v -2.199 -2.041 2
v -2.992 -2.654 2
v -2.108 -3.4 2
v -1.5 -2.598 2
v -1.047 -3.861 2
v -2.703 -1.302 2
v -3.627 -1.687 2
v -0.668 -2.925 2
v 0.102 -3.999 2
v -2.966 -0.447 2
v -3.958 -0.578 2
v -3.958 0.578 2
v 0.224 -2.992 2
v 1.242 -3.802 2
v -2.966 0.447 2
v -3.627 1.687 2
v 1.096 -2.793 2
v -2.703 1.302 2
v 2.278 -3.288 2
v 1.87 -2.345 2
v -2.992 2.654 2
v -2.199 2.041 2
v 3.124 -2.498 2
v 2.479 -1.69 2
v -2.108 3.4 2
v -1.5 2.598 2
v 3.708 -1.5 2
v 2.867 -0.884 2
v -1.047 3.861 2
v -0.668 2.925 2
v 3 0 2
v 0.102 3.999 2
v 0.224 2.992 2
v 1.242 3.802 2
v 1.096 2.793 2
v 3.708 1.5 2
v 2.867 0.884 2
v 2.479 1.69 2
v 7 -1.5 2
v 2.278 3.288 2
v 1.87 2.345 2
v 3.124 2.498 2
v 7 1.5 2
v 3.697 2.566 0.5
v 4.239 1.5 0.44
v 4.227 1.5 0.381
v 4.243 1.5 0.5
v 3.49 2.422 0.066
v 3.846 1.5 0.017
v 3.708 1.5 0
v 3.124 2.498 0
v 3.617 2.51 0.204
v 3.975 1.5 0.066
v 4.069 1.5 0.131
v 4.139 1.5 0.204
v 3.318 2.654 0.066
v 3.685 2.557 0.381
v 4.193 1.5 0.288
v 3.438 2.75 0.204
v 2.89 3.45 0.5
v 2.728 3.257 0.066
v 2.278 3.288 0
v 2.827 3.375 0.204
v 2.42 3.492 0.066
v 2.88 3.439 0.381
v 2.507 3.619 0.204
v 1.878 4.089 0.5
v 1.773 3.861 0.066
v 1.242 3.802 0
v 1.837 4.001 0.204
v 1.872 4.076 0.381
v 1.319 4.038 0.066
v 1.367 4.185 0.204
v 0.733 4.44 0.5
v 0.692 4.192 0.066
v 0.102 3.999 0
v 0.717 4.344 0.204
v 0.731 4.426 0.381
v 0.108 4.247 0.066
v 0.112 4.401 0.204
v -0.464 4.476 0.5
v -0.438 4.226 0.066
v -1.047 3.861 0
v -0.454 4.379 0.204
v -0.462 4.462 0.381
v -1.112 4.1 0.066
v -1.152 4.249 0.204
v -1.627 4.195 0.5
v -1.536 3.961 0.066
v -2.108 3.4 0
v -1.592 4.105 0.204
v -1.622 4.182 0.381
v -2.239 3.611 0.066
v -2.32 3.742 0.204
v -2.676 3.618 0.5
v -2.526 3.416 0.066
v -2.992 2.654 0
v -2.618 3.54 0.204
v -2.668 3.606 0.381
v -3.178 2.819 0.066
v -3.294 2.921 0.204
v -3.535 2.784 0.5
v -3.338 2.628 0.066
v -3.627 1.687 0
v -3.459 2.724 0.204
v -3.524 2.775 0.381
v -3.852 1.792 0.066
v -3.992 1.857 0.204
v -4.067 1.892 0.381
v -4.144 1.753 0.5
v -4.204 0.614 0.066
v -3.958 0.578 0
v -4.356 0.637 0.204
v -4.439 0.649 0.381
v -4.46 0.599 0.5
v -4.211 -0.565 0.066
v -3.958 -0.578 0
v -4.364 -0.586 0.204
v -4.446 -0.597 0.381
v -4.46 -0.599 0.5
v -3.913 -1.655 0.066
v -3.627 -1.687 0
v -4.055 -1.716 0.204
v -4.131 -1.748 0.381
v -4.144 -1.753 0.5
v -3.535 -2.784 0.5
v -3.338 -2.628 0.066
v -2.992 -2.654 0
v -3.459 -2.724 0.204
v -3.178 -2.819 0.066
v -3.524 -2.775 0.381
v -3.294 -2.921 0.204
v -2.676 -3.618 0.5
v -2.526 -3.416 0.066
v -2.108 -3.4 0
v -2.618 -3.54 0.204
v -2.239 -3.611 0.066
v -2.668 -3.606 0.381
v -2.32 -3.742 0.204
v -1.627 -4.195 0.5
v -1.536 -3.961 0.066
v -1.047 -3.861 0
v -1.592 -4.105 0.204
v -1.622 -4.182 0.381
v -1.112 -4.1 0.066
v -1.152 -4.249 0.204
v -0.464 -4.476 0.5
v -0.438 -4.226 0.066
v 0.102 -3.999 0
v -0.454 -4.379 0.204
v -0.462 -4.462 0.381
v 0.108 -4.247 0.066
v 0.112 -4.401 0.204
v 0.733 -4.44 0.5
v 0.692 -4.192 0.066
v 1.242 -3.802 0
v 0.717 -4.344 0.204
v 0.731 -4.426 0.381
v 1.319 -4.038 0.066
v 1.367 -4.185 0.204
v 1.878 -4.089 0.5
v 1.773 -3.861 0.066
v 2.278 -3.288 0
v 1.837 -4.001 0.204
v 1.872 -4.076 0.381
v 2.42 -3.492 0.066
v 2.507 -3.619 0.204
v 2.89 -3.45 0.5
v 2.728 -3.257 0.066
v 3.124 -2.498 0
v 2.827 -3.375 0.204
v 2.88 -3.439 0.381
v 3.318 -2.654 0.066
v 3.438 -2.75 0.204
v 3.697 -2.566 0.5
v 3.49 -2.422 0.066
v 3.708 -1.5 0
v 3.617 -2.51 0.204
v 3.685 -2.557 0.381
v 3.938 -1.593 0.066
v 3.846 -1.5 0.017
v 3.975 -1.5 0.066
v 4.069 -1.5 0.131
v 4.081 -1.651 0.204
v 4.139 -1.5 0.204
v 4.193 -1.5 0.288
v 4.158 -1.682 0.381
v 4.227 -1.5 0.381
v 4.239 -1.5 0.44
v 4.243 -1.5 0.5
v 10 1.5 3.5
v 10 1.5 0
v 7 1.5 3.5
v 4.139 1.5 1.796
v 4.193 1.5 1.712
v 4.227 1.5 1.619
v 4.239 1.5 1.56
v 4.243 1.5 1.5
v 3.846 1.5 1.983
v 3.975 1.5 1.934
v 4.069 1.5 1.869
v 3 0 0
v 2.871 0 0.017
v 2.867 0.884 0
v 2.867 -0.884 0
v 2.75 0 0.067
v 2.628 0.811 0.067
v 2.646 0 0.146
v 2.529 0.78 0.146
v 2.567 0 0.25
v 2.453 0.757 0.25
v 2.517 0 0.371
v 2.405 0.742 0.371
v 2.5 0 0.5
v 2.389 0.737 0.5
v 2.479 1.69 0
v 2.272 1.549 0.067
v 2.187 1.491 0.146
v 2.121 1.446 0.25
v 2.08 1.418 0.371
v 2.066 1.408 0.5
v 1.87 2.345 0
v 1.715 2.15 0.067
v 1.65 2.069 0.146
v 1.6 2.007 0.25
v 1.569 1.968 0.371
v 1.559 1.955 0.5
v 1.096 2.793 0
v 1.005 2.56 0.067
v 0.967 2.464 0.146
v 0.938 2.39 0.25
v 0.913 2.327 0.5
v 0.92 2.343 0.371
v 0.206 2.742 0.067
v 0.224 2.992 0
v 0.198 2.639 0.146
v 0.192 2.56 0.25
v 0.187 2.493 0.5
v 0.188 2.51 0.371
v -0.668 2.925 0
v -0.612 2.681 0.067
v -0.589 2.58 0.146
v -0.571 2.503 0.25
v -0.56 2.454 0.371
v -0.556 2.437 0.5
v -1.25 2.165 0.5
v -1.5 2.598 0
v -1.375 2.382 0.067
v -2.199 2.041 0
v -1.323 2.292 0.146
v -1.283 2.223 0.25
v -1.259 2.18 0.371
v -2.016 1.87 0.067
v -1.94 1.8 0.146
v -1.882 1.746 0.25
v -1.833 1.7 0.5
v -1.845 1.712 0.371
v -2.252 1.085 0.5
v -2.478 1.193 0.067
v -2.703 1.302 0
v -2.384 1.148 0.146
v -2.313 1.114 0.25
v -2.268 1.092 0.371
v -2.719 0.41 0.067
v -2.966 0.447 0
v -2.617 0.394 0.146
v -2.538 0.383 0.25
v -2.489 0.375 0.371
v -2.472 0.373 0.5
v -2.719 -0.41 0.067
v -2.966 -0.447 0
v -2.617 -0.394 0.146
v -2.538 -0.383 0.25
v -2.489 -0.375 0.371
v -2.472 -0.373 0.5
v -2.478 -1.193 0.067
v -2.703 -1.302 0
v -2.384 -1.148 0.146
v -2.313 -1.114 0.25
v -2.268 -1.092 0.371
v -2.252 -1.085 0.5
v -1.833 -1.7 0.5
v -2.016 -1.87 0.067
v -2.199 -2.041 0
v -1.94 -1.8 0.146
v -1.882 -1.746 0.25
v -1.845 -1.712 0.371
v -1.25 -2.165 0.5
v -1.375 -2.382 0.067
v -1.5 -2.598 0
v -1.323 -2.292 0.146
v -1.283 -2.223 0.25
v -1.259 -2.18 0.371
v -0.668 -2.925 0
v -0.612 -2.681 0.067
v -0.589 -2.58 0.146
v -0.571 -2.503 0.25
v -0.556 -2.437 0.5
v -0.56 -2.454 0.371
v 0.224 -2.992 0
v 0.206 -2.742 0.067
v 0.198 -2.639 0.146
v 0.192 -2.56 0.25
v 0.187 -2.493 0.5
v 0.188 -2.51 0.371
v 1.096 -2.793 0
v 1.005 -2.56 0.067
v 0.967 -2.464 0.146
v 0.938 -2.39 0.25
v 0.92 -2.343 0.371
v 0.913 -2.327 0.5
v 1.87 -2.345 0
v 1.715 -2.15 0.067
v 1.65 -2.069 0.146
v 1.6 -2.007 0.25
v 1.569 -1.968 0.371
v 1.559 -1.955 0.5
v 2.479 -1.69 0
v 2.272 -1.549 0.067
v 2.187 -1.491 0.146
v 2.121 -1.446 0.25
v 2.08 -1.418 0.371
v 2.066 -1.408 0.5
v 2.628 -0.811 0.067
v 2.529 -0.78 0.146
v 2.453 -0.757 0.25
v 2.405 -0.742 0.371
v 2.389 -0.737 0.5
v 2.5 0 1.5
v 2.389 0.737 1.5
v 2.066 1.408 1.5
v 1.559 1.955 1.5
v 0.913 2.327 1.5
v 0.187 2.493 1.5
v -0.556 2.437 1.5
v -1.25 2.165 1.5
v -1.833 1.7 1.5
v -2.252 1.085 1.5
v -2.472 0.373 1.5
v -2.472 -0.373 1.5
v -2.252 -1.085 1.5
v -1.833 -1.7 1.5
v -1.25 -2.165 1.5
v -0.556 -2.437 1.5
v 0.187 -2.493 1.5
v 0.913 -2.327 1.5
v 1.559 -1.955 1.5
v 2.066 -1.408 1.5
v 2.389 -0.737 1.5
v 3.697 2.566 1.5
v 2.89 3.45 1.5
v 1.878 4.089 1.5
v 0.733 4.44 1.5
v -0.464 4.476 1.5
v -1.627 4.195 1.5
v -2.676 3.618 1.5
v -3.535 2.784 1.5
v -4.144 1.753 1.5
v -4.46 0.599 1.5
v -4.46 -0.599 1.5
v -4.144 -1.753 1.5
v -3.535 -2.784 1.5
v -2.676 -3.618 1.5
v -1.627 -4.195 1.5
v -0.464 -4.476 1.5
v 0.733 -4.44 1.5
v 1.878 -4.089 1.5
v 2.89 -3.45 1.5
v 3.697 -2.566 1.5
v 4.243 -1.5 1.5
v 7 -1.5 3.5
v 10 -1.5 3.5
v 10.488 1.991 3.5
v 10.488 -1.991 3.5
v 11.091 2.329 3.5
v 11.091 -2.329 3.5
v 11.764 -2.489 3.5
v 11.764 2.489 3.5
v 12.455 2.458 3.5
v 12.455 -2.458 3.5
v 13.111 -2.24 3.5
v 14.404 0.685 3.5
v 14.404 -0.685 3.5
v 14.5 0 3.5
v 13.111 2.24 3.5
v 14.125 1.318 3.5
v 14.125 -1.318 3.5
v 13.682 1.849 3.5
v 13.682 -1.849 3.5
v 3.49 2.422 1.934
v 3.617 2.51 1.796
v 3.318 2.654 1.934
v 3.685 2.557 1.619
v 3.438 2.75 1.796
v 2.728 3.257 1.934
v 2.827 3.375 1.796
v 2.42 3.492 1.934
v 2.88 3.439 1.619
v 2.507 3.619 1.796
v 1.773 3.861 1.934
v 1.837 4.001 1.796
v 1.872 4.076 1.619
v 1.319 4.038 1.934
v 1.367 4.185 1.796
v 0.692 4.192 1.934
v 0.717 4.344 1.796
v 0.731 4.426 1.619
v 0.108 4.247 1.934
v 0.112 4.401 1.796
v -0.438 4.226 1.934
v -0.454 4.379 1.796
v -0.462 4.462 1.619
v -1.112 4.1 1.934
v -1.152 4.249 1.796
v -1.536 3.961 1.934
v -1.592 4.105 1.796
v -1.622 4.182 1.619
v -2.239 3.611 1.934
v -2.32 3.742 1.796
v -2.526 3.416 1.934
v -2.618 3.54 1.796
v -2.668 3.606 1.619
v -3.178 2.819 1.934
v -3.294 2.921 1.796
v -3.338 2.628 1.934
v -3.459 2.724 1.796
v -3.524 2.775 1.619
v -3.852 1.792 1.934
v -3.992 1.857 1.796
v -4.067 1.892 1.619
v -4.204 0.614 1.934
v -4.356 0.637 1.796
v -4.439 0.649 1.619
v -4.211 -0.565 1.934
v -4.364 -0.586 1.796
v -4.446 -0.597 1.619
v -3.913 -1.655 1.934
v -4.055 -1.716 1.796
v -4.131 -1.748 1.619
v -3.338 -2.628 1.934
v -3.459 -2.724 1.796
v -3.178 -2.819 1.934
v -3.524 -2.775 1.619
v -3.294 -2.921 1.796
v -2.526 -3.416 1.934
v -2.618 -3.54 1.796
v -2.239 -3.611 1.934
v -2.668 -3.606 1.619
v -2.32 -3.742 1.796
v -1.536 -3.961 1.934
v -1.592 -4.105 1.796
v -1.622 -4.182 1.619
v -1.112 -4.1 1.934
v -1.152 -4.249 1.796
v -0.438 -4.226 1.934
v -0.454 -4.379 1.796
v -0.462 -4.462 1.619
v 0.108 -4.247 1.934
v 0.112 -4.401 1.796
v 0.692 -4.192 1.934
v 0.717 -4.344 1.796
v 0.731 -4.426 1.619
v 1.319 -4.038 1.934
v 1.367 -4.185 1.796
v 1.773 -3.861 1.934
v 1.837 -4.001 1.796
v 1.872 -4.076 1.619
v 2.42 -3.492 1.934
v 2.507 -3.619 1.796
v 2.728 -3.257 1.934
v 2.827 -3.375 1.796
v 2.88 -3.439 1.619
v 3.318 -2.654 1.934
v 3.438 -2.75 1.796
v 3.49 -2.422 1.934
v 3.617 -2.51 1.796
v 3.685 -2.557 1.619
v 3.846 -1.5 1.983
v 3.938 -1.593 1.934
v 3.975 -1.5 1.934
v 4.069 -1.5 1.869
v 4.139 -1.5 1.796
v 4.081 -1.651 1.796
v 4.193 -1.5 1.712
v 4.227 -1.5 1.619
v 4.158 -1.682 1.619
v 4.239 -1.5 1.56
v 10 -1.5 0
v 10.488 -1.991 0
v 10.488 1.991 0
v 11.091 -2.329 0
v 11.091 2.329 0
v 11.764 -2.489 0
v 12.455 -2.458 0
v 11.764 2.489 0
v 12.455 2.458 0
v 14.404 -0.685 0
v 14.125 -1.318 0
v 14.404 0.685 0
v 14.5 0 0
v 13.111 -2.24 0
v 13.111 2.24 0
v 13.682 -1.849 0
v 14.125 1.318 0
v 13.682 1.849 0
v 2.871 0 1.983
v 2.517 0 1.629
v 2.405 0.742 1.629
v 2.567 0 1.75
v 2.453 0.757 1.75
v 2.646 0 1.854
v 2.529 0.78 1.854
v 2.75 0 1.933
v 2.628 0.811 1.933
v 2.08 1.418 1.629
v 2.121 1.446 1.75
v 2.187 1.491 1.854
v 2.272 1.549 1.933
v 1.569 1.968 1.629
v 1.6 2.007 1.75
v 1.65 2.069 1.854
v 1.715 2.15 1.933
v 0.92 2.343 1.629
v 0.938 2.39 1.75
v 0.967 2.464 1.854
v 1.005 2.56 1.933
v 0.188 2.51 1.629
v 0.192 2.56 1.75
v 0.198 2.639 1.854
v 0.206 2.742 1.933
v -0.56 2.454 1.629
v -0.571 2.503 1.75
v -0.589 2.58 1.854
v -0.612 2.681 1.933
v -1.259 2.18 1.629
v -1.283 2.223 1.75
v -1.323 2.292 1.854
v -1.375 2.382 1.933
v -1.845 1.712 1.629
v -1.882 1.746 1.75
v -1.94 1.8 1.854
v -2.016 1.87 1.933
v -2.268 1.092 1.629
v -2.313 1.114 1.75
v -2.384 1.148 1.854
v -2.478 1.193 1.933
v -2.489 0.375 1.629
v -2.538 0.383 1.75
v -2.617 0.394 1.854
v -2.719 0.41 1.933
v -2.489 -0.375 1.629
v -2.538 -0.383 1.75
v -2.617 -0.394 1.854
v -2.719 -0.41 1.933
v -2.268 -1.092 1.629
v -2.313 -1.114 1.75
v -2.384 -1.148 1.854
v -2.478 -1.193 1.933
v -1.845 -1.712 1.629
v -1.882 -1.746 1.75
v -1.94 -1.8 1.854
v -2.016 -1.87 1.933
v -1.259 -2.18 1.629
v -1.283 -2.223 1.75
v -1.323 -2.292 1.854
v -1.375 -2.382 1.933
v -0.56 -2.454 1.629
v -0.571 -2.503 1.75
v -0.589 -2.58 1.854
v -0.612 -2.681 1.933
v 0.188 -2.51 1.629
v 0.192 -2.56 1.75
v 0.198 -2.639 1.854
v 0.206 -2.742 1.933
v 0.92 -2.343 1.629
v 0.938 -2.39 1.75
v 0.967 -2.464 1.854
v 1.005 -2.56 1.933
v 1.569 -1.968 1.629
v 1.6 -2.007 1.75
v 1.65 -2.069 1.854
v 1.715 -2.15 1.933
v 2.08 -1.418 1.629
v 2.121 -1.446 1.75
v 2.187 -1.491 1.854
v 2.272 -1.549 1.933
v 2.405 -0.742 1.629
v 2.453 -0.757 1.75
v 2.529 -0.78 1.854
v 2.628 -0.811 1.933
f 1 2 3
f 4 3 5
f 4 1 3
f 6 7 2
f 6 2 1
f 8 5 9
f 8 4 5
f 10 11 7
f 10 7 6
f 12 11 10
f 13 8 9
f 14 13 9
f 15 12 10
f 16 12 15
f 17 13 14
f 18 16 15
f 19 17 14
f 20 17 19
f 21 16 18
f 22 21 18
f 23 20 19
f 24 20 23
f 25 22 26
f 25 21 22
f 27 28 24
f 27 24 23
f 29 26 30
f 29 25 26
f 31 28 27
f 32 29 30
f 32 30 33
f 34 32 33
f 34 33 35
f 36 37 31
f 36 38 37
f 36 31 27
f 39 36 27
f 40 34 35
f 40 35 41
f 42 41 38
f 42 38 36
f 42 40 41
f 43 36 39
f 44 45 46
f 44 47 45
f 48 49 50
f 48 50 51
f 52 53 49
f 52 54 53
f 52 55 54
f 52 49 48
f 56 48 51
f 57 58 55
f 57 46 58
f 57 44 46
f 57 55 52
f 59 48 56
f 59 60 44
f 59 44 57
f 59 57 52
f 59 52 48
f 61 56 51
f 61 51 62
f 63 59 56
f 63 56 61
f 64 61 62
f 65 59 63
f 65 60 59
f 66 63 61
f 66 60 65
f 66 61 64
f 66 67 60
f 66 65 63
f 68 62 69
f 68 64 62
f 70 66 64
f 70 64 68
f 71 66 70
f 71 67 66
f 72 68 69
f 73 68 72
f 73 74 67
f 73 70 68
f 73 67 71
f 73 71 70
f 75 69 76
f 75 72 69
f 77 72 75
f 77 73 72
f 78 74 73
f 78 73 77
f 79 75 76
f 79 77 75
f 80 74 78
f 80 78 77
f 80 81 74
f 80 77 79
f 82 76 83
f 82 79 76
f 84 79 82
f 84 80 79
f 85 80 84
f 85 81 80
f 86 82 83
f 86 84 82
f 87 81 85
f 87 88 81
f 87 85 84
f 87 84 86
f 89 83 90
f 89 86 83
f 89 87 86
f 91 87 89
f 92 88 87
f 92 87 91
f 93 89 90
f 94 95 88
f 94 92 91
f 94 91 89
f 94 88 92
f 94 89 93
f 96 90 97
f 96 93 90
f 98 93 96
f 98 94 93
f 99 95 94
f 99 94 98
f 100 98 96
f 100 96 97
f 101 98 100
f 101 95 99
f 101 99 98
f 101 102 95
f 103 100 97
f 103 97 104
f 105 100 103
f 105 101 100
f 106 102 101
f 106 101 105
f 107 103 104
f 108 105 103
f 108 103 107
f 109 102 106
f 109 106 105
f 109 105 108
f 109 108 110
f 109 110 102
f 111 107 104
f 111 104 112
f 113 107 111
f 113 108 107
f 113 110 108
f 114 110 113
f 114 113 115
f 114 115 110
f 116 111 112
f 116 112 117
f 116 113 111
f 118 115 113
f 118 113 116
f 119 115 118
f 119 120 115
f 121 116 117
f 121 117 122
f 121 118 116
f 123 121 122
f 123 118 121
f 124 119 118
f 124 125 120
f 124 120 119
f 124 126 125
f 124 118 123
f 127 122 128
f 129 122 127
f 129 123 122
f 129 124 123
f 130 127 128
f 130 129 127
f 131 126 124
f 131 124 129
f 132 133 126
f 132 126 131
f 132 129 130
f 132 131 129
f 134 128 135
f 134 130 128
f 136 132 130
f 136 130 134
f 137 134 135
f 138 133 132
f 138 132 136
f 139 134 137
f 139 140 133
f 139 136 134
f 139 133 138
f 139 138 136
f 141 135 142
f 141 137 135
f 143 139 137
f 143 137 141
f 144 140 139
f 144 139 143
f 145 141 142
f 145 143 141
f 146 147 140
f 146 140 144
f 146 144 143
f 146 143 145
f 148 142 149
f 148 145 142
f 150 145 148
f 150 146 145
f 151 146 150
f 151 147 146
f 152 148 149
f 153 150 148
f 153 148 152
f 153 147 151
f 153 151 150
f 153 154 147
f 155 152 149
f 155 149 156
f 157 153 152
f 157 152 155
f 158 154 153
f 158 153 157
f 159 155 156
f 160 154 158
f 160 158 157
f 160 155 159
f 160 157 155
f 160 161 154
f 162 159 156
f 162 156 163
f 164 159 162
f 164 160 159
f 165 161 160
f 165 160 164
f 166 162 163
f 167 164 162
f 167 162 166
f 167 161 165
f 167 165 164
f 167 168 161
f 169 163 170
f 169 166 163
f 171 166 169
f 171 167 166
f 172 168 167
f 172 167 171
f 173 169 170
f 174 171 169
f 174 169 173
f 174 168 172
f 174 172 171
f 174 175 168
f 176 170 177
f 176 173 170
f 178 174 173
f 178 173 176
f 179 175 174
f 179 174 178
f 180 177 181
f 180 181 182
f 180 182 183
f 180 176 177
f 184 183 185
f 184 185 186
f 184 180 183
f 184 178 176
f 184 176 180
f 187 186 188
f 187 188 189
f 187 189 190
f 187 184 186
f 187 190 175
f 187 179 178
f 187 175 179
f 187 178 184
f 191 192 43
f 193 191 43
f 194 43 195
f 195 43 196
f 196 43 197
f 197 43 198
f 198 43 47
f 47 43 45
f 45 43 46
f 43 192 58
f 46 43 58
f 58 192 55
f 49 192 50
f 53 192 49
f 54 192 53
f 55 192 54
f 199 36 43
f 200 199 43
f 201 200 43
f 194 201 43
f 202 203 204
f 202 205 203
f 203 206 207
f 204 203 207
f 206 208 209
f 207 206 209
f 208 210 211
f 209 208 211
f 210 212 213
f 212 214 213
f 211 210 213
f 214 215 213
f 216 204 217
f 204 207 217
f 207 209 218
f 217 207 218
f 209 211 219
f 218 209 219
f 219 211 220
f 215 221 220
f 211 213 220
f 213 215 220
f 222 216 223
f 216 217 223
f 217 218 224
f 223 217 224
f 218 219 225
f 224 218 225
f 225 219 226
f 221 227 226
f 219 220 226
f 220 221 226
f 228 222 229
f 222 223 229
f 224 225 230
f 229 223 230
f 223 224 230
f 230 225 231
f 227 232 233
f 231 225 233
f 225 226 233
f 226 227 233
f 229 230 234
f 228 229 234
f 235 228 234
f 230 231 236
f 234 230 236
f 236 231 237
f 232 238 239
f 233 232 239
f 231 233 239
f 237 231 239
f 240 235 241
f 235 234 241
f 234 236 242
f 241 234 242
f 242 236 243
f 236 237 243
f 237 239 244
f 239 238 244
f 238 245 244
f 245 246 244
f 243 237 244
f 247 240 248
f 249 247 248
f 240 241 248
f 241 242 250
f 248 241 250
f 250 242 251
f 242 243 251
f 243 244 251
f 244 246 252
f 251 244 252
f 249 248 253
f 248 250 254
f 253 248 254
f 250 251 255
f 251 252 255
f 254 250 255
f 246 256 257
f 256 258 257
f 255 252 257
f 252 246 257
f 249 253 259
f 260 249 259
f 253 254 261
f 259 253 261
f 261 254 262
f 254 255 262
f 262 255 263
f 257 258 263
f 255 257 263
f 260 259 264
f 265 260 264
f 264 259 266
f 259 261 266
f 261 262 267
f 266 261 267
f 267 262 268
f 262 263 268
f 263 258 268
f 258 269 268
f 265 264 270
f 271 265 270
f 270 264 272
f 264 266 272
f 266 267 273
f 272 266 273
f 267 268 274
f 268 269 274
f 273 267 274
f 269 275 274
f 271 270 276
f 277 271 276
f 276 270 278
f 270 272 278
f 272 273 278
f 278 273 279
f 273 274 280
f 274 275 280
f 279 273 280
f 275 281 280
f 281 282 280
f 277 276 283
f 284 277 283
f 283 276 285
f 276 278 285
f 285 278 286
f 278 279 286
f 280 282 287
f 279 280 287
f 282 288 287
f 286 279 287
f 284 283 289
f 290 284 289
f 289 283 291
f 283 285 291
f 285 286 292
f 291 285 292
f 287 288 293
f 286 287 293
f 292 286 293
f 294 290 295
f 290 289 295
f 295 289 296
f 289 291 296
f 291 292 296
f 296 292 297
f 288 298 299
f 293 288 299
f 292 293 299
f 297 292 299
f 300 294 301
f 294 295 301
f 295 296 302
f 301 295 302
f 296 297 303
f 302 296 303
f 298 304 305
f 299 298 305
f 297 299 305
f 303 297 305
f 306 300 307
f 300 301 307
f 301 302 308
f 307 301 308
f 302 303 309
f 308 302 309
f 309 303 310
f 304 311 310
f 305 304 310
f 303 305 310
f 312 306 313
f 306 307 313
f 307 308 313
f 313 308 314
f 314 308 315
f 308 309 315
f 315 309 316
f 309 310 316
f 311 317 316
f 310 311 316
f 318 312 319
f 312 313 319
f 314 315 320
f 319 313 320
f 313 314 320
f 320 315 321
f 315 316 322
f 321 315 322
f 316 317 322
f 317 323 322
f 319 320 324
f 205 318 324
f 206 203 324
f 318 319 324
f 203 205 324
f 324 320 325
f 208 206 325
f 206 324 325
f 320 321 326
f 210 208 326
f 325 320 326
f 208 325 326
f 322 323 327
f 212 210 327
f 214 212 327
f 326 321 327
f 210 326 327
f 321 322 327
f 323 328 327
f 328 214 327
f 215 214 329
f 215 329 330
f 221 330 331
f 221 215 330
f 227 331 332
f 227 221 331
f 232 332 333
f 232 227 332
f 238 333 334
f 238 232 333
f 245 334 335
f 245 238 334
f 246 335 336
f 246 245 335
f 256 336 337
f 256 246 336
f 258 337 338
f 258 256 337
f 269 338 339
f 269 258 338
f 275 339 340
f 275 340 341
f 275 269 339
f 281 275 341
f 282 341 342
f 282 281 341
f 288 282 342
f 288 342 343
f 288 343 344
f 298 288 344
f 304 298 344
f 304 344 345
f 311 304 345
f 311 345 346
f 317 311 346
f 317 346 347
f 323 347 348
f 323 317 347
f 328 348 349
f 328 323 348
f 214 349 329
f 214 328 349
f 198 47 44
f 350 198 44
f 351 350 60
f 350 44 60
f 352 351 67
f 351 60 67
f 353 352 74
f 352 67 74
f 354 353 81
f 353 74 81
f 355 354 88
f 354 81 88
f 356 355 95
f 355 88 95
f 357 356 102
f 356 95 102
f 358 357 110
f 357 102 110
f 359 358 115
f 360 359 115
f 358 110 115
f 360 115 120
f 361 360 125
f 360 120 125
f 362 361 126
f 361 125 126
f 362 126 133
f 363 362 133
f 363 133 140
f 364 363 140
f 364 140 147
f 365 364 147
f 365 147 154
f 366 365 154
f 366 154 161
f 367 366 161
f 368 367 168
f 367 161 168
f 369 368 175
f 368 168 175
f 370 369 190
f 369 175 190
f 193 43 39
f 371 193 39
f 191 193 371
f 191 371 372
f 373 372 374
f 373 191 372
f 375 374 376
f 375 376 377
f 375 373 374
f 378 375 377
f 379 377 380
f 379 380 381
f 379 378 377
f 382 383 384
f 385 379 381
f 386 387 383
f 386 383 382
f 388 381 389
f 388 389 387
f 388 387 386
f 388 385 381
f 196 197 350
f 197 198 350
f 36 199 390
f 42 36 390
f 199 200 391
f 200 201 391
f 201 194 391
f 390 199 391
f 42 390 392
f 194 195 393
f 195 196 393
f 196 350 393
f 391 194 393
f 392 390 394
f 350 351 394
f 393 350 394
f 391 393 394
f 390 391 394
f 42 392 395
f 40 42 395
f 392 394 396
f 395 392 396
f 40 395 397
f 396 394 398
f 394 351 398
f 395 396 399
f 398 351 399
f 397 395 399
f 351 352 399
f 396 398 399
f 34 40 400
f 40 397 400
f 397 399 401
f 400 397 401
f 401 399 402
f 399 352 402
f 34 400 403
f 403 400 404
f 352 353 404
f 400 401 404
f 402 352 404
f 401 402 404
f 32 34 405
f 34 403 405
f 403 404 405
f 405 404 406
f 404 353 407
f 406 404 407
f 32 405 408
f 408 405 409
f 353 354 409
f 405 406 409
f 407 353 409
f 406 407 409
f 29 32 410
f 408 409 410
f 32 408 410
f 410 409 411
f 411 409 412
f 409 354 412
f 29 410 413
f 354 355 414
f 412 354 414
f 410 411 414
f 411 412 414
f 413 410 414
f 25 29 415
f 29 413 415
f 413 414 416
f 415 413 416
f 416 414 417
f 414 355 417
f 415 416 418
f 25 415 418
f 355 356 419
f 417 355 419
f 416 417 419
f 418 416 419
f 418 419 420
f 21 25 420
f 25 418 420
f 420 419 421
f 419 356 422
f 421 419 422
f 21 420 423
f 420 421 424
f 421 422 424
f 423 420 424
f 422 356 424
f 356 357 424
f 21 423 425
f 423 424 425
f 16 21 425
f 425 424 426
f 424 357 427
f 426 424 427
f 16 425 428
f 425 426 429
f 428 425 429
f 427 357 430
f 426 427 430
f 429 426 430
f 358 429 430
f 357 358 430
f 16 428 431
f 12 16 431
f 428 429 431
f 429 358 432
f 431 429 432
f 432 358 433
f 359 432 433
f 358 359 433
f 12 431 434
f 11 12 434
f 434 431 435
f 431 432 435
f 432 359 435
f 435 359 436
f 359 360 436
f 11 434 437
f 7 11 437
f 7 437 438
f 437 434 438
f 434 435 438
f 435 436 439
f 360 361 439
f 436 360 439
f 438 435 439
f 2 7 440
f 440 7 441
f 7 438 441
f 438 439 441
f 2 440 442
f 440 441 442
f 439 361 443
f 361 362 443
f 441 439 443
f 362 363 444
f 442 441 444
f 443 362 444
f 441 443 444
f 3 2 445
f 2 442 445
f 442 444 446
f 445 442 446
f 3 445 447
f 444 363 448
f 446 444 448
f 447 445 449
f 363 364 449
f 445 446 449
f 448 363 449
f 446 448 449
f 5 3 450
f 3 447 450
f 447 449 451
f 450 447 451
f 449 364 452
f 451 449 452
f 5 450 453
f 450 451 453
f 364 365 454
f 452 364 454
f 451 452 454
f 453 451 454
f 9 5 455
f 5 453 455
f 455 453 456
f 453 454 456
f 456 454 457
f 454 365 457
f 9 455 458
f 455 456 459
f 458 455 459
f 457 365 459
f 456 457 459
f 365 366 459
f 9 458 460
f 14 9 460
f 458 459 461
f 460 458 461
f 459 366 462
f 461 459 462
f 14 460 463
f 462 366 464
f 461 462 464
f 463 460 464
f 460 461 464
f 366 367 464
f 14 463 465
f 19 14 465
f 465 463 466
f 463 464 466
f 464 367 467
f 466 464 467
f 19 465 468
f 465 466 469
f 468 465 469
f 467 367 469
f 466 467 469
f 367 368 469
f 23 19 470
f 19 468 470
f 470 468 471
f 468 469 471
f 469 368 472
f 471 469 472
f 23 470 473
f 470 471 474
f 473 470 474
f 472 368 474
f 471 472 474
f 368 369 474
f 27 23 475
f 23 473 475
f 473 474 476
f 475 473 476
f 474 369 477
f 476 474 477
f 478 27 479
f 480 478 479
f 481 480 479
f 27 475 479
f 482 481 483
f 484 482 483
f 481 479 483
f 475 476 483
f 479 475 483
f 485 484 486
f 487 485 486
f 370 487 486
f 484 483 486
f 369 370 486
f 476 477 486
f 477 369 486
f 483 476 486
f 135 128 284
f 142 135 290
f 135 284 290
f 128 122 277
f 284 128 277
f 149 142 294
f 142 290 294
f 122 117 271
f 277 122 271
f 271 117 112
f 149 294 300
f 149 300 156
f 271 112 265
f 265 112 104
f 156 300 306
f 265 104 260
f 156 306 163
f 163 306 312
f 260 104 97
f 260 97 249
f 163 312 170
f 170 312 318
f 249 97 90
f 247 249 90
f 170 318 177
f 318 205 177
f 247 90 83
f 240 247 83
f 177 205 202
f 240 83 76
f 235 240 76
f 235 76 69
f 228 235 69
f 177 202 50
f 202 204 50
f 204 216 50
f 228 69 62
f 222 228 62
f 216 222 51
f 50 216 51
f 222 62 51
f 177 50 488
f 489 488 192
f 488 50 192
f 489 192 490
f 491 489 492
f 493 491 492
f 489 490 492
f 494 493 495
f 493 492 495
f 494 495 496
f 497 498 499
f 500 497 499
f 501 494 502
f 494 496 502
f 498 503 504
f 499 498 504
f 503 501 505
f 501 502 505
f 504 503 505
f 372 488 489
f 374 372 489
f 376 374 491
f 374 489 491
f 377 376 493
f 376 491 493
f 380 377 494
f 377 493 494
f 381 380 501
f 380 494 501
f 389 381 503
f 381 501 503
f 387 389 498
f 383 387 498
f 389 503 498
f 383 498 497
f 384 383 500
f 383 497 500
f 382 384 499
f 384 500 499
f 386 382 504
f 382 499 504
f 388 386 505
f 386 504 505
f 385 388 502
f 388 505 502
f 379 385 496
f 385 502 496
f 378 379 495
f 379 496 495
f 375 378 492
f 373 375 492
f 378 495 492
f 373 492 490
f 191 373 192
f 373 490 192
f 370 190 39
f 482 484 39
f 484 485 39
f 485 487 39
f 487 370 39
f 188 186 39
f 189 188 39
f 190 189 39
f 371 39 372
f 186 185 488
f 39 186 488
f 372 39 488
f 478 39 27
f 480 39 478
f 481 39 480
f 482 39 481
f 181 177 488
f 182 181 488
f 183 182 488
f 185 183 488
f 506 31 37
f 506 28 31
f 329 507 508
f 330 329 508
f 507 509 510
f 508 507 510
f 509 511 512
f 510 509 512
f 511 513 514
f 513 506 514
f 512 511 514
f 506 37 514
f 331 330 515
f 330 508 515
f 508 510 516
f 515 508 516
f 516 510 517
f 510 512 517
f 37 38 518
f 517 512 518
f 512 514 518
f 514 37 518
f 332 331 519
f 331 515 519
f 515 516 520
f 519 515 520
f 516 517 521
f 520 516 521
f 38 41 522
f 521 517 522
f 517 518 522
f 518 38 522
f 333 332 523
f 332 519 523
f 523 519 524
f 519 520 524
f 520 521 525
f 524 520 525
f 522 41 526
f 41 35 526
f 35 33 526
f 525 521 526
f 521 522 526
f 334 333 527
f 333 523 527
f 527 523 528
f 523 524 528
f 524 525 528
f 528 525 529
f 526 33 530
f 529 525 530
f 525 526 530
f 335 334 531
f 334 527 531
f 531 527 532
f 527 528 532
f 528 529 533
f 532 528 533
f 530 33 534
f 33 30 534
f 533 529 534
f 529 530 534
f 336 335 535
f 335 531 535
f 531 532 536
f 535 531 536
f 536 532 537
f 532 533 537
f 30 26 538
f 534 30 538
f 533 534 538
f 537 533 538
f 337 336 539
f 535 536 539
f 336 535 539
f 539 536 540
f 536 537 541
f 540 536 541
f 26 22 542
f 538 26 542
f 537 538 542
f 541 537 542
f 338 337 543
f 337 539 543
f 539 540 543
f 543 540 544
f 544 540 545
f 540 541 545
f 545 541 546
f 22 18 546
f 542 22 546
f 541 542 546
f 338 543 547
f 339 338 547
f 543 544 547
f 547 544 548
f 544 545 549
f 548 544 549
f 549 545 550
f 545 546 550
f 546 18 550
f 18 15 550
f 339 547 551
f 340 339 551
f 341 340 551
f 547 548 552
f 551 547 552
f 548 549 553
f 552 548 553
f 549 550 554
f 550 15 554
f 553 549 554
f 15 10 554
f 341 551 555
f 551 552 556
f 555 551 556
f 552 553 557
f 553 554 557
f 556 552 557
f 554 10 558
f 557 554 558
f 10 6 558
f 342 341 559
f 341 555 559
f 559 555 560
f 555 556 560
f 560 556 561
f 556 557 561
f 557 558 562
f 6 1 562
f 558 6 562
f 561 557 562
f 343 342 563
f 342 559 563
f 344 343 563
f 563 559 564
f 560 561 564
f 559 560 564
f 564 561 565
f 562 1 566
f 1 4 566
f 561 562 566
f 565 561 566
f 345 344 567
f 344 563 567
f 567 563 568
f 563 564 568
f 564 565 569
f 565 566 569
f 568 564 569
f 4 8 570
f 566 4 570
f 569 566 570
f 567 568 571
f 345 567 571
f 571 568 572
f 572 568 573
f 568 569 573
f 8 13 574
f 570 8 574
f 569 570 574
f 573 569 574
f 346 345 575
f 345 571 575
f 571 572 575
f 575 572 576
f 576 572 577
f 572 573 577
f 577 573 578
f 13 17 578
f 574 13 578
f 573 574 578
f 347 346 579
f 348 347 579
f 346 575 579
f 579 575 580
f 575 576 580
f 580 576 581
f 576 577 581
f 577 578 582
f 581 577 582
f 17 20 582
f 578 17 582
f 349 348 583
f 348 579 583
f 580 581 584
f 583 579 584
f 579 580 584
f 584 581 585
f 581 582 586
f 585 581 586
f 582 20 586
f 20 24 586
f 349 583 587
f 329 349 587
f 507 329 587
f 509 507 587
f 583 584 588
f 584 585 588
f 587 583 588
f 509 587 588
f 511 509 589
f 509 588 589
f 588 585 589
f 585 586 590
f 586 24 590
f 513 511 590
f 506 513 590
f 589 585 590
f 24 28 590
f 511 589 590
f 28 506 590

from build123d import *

# Parameters (mm, degrees)
F0_R     = 2.5
F1_DEPTH = 2
F3_DEPTH = 1.5
F4_R     = 0.5


with BuildPart() as f1:
    # F0 (on Top) → F1 (new body)
    with BuildSketch(Plane.XY):
        with BuildLine():
            ThreePointArc((4.242641, -1.5), (4.435194, -0.760959), (4.5, 0))
            ThreePointArc((4.5, 0), (4.435194, 0.760959), (4.242641, 1.5))
            ThreePointArc((4.242641, 1.5), (-4.5, 0), (4.242641, -1.5))
        make_face()
        Circle(F0_R, mode=Mode.SUBTRACT)
        with BuildLine():
            ThreePointArc((4.242641, 1.5), (4.435194, 0.760959), (4.5, 0))
            ThreePointArc((4.5, 0), (4.435194, -0.760959), (4.242641, -1.5))
            Line((4.242641, -1.5), (10, -1.5))
            ThreePointArc((10, -1.5), (9.5, 0), (10, 1.5))
            Line((10, 1.5), (4.242641, 1.5))
        make_face()
        with BuildLine():
            ThreePointArc((14.5, 0), (12.790569, 2.371708), (10, 1.5))
            ThreePointArc((10, 1.5), (9.5, 0), (10, -1.5))
            ThreePointArc((10, -1.5), (12.790569, -2.371708), (14.5, 0))
        make_face()
    extrude(amount=F1_DEPTH)

    # F2 (on face) → F3 (join)
    with BuildSketch(Plane.XY.offset(2)):
        with BuildLine():
            ThreePointArc((10, -1.5), (12.790569, -2.371708), (14.5, 0))
            ThreePointArc((14.5, 0), (12.790569, 2.371708), (10, 1.5))
            ThreePointArc((10, 1.5), (9.5, 0), (10, -1.5))
        make_face()
        with BuildLine():
            ThreePointArc((10, -1.5), (9.5, 0), (10, 1.5))
            Line((10, 1.5), (7, 1.5))
            Line((7, 1.5), (7, -1.5))
            Line((7, -1.5), (10, -1.5))
        make_face()
    extrude(amount=F3_DEPTH)

    # F4
    f4_edges = [f1.edges().sort_by_distance(p)[0] for p in [
        (-2.5, 0, 2),
        (-4.5, 0, 2),
        (-4.5, 0, 0),
        (-2.5, 0, 0),
    ]]
    fillet(f4_edges, radius=F4_R)


solid = f1.part
